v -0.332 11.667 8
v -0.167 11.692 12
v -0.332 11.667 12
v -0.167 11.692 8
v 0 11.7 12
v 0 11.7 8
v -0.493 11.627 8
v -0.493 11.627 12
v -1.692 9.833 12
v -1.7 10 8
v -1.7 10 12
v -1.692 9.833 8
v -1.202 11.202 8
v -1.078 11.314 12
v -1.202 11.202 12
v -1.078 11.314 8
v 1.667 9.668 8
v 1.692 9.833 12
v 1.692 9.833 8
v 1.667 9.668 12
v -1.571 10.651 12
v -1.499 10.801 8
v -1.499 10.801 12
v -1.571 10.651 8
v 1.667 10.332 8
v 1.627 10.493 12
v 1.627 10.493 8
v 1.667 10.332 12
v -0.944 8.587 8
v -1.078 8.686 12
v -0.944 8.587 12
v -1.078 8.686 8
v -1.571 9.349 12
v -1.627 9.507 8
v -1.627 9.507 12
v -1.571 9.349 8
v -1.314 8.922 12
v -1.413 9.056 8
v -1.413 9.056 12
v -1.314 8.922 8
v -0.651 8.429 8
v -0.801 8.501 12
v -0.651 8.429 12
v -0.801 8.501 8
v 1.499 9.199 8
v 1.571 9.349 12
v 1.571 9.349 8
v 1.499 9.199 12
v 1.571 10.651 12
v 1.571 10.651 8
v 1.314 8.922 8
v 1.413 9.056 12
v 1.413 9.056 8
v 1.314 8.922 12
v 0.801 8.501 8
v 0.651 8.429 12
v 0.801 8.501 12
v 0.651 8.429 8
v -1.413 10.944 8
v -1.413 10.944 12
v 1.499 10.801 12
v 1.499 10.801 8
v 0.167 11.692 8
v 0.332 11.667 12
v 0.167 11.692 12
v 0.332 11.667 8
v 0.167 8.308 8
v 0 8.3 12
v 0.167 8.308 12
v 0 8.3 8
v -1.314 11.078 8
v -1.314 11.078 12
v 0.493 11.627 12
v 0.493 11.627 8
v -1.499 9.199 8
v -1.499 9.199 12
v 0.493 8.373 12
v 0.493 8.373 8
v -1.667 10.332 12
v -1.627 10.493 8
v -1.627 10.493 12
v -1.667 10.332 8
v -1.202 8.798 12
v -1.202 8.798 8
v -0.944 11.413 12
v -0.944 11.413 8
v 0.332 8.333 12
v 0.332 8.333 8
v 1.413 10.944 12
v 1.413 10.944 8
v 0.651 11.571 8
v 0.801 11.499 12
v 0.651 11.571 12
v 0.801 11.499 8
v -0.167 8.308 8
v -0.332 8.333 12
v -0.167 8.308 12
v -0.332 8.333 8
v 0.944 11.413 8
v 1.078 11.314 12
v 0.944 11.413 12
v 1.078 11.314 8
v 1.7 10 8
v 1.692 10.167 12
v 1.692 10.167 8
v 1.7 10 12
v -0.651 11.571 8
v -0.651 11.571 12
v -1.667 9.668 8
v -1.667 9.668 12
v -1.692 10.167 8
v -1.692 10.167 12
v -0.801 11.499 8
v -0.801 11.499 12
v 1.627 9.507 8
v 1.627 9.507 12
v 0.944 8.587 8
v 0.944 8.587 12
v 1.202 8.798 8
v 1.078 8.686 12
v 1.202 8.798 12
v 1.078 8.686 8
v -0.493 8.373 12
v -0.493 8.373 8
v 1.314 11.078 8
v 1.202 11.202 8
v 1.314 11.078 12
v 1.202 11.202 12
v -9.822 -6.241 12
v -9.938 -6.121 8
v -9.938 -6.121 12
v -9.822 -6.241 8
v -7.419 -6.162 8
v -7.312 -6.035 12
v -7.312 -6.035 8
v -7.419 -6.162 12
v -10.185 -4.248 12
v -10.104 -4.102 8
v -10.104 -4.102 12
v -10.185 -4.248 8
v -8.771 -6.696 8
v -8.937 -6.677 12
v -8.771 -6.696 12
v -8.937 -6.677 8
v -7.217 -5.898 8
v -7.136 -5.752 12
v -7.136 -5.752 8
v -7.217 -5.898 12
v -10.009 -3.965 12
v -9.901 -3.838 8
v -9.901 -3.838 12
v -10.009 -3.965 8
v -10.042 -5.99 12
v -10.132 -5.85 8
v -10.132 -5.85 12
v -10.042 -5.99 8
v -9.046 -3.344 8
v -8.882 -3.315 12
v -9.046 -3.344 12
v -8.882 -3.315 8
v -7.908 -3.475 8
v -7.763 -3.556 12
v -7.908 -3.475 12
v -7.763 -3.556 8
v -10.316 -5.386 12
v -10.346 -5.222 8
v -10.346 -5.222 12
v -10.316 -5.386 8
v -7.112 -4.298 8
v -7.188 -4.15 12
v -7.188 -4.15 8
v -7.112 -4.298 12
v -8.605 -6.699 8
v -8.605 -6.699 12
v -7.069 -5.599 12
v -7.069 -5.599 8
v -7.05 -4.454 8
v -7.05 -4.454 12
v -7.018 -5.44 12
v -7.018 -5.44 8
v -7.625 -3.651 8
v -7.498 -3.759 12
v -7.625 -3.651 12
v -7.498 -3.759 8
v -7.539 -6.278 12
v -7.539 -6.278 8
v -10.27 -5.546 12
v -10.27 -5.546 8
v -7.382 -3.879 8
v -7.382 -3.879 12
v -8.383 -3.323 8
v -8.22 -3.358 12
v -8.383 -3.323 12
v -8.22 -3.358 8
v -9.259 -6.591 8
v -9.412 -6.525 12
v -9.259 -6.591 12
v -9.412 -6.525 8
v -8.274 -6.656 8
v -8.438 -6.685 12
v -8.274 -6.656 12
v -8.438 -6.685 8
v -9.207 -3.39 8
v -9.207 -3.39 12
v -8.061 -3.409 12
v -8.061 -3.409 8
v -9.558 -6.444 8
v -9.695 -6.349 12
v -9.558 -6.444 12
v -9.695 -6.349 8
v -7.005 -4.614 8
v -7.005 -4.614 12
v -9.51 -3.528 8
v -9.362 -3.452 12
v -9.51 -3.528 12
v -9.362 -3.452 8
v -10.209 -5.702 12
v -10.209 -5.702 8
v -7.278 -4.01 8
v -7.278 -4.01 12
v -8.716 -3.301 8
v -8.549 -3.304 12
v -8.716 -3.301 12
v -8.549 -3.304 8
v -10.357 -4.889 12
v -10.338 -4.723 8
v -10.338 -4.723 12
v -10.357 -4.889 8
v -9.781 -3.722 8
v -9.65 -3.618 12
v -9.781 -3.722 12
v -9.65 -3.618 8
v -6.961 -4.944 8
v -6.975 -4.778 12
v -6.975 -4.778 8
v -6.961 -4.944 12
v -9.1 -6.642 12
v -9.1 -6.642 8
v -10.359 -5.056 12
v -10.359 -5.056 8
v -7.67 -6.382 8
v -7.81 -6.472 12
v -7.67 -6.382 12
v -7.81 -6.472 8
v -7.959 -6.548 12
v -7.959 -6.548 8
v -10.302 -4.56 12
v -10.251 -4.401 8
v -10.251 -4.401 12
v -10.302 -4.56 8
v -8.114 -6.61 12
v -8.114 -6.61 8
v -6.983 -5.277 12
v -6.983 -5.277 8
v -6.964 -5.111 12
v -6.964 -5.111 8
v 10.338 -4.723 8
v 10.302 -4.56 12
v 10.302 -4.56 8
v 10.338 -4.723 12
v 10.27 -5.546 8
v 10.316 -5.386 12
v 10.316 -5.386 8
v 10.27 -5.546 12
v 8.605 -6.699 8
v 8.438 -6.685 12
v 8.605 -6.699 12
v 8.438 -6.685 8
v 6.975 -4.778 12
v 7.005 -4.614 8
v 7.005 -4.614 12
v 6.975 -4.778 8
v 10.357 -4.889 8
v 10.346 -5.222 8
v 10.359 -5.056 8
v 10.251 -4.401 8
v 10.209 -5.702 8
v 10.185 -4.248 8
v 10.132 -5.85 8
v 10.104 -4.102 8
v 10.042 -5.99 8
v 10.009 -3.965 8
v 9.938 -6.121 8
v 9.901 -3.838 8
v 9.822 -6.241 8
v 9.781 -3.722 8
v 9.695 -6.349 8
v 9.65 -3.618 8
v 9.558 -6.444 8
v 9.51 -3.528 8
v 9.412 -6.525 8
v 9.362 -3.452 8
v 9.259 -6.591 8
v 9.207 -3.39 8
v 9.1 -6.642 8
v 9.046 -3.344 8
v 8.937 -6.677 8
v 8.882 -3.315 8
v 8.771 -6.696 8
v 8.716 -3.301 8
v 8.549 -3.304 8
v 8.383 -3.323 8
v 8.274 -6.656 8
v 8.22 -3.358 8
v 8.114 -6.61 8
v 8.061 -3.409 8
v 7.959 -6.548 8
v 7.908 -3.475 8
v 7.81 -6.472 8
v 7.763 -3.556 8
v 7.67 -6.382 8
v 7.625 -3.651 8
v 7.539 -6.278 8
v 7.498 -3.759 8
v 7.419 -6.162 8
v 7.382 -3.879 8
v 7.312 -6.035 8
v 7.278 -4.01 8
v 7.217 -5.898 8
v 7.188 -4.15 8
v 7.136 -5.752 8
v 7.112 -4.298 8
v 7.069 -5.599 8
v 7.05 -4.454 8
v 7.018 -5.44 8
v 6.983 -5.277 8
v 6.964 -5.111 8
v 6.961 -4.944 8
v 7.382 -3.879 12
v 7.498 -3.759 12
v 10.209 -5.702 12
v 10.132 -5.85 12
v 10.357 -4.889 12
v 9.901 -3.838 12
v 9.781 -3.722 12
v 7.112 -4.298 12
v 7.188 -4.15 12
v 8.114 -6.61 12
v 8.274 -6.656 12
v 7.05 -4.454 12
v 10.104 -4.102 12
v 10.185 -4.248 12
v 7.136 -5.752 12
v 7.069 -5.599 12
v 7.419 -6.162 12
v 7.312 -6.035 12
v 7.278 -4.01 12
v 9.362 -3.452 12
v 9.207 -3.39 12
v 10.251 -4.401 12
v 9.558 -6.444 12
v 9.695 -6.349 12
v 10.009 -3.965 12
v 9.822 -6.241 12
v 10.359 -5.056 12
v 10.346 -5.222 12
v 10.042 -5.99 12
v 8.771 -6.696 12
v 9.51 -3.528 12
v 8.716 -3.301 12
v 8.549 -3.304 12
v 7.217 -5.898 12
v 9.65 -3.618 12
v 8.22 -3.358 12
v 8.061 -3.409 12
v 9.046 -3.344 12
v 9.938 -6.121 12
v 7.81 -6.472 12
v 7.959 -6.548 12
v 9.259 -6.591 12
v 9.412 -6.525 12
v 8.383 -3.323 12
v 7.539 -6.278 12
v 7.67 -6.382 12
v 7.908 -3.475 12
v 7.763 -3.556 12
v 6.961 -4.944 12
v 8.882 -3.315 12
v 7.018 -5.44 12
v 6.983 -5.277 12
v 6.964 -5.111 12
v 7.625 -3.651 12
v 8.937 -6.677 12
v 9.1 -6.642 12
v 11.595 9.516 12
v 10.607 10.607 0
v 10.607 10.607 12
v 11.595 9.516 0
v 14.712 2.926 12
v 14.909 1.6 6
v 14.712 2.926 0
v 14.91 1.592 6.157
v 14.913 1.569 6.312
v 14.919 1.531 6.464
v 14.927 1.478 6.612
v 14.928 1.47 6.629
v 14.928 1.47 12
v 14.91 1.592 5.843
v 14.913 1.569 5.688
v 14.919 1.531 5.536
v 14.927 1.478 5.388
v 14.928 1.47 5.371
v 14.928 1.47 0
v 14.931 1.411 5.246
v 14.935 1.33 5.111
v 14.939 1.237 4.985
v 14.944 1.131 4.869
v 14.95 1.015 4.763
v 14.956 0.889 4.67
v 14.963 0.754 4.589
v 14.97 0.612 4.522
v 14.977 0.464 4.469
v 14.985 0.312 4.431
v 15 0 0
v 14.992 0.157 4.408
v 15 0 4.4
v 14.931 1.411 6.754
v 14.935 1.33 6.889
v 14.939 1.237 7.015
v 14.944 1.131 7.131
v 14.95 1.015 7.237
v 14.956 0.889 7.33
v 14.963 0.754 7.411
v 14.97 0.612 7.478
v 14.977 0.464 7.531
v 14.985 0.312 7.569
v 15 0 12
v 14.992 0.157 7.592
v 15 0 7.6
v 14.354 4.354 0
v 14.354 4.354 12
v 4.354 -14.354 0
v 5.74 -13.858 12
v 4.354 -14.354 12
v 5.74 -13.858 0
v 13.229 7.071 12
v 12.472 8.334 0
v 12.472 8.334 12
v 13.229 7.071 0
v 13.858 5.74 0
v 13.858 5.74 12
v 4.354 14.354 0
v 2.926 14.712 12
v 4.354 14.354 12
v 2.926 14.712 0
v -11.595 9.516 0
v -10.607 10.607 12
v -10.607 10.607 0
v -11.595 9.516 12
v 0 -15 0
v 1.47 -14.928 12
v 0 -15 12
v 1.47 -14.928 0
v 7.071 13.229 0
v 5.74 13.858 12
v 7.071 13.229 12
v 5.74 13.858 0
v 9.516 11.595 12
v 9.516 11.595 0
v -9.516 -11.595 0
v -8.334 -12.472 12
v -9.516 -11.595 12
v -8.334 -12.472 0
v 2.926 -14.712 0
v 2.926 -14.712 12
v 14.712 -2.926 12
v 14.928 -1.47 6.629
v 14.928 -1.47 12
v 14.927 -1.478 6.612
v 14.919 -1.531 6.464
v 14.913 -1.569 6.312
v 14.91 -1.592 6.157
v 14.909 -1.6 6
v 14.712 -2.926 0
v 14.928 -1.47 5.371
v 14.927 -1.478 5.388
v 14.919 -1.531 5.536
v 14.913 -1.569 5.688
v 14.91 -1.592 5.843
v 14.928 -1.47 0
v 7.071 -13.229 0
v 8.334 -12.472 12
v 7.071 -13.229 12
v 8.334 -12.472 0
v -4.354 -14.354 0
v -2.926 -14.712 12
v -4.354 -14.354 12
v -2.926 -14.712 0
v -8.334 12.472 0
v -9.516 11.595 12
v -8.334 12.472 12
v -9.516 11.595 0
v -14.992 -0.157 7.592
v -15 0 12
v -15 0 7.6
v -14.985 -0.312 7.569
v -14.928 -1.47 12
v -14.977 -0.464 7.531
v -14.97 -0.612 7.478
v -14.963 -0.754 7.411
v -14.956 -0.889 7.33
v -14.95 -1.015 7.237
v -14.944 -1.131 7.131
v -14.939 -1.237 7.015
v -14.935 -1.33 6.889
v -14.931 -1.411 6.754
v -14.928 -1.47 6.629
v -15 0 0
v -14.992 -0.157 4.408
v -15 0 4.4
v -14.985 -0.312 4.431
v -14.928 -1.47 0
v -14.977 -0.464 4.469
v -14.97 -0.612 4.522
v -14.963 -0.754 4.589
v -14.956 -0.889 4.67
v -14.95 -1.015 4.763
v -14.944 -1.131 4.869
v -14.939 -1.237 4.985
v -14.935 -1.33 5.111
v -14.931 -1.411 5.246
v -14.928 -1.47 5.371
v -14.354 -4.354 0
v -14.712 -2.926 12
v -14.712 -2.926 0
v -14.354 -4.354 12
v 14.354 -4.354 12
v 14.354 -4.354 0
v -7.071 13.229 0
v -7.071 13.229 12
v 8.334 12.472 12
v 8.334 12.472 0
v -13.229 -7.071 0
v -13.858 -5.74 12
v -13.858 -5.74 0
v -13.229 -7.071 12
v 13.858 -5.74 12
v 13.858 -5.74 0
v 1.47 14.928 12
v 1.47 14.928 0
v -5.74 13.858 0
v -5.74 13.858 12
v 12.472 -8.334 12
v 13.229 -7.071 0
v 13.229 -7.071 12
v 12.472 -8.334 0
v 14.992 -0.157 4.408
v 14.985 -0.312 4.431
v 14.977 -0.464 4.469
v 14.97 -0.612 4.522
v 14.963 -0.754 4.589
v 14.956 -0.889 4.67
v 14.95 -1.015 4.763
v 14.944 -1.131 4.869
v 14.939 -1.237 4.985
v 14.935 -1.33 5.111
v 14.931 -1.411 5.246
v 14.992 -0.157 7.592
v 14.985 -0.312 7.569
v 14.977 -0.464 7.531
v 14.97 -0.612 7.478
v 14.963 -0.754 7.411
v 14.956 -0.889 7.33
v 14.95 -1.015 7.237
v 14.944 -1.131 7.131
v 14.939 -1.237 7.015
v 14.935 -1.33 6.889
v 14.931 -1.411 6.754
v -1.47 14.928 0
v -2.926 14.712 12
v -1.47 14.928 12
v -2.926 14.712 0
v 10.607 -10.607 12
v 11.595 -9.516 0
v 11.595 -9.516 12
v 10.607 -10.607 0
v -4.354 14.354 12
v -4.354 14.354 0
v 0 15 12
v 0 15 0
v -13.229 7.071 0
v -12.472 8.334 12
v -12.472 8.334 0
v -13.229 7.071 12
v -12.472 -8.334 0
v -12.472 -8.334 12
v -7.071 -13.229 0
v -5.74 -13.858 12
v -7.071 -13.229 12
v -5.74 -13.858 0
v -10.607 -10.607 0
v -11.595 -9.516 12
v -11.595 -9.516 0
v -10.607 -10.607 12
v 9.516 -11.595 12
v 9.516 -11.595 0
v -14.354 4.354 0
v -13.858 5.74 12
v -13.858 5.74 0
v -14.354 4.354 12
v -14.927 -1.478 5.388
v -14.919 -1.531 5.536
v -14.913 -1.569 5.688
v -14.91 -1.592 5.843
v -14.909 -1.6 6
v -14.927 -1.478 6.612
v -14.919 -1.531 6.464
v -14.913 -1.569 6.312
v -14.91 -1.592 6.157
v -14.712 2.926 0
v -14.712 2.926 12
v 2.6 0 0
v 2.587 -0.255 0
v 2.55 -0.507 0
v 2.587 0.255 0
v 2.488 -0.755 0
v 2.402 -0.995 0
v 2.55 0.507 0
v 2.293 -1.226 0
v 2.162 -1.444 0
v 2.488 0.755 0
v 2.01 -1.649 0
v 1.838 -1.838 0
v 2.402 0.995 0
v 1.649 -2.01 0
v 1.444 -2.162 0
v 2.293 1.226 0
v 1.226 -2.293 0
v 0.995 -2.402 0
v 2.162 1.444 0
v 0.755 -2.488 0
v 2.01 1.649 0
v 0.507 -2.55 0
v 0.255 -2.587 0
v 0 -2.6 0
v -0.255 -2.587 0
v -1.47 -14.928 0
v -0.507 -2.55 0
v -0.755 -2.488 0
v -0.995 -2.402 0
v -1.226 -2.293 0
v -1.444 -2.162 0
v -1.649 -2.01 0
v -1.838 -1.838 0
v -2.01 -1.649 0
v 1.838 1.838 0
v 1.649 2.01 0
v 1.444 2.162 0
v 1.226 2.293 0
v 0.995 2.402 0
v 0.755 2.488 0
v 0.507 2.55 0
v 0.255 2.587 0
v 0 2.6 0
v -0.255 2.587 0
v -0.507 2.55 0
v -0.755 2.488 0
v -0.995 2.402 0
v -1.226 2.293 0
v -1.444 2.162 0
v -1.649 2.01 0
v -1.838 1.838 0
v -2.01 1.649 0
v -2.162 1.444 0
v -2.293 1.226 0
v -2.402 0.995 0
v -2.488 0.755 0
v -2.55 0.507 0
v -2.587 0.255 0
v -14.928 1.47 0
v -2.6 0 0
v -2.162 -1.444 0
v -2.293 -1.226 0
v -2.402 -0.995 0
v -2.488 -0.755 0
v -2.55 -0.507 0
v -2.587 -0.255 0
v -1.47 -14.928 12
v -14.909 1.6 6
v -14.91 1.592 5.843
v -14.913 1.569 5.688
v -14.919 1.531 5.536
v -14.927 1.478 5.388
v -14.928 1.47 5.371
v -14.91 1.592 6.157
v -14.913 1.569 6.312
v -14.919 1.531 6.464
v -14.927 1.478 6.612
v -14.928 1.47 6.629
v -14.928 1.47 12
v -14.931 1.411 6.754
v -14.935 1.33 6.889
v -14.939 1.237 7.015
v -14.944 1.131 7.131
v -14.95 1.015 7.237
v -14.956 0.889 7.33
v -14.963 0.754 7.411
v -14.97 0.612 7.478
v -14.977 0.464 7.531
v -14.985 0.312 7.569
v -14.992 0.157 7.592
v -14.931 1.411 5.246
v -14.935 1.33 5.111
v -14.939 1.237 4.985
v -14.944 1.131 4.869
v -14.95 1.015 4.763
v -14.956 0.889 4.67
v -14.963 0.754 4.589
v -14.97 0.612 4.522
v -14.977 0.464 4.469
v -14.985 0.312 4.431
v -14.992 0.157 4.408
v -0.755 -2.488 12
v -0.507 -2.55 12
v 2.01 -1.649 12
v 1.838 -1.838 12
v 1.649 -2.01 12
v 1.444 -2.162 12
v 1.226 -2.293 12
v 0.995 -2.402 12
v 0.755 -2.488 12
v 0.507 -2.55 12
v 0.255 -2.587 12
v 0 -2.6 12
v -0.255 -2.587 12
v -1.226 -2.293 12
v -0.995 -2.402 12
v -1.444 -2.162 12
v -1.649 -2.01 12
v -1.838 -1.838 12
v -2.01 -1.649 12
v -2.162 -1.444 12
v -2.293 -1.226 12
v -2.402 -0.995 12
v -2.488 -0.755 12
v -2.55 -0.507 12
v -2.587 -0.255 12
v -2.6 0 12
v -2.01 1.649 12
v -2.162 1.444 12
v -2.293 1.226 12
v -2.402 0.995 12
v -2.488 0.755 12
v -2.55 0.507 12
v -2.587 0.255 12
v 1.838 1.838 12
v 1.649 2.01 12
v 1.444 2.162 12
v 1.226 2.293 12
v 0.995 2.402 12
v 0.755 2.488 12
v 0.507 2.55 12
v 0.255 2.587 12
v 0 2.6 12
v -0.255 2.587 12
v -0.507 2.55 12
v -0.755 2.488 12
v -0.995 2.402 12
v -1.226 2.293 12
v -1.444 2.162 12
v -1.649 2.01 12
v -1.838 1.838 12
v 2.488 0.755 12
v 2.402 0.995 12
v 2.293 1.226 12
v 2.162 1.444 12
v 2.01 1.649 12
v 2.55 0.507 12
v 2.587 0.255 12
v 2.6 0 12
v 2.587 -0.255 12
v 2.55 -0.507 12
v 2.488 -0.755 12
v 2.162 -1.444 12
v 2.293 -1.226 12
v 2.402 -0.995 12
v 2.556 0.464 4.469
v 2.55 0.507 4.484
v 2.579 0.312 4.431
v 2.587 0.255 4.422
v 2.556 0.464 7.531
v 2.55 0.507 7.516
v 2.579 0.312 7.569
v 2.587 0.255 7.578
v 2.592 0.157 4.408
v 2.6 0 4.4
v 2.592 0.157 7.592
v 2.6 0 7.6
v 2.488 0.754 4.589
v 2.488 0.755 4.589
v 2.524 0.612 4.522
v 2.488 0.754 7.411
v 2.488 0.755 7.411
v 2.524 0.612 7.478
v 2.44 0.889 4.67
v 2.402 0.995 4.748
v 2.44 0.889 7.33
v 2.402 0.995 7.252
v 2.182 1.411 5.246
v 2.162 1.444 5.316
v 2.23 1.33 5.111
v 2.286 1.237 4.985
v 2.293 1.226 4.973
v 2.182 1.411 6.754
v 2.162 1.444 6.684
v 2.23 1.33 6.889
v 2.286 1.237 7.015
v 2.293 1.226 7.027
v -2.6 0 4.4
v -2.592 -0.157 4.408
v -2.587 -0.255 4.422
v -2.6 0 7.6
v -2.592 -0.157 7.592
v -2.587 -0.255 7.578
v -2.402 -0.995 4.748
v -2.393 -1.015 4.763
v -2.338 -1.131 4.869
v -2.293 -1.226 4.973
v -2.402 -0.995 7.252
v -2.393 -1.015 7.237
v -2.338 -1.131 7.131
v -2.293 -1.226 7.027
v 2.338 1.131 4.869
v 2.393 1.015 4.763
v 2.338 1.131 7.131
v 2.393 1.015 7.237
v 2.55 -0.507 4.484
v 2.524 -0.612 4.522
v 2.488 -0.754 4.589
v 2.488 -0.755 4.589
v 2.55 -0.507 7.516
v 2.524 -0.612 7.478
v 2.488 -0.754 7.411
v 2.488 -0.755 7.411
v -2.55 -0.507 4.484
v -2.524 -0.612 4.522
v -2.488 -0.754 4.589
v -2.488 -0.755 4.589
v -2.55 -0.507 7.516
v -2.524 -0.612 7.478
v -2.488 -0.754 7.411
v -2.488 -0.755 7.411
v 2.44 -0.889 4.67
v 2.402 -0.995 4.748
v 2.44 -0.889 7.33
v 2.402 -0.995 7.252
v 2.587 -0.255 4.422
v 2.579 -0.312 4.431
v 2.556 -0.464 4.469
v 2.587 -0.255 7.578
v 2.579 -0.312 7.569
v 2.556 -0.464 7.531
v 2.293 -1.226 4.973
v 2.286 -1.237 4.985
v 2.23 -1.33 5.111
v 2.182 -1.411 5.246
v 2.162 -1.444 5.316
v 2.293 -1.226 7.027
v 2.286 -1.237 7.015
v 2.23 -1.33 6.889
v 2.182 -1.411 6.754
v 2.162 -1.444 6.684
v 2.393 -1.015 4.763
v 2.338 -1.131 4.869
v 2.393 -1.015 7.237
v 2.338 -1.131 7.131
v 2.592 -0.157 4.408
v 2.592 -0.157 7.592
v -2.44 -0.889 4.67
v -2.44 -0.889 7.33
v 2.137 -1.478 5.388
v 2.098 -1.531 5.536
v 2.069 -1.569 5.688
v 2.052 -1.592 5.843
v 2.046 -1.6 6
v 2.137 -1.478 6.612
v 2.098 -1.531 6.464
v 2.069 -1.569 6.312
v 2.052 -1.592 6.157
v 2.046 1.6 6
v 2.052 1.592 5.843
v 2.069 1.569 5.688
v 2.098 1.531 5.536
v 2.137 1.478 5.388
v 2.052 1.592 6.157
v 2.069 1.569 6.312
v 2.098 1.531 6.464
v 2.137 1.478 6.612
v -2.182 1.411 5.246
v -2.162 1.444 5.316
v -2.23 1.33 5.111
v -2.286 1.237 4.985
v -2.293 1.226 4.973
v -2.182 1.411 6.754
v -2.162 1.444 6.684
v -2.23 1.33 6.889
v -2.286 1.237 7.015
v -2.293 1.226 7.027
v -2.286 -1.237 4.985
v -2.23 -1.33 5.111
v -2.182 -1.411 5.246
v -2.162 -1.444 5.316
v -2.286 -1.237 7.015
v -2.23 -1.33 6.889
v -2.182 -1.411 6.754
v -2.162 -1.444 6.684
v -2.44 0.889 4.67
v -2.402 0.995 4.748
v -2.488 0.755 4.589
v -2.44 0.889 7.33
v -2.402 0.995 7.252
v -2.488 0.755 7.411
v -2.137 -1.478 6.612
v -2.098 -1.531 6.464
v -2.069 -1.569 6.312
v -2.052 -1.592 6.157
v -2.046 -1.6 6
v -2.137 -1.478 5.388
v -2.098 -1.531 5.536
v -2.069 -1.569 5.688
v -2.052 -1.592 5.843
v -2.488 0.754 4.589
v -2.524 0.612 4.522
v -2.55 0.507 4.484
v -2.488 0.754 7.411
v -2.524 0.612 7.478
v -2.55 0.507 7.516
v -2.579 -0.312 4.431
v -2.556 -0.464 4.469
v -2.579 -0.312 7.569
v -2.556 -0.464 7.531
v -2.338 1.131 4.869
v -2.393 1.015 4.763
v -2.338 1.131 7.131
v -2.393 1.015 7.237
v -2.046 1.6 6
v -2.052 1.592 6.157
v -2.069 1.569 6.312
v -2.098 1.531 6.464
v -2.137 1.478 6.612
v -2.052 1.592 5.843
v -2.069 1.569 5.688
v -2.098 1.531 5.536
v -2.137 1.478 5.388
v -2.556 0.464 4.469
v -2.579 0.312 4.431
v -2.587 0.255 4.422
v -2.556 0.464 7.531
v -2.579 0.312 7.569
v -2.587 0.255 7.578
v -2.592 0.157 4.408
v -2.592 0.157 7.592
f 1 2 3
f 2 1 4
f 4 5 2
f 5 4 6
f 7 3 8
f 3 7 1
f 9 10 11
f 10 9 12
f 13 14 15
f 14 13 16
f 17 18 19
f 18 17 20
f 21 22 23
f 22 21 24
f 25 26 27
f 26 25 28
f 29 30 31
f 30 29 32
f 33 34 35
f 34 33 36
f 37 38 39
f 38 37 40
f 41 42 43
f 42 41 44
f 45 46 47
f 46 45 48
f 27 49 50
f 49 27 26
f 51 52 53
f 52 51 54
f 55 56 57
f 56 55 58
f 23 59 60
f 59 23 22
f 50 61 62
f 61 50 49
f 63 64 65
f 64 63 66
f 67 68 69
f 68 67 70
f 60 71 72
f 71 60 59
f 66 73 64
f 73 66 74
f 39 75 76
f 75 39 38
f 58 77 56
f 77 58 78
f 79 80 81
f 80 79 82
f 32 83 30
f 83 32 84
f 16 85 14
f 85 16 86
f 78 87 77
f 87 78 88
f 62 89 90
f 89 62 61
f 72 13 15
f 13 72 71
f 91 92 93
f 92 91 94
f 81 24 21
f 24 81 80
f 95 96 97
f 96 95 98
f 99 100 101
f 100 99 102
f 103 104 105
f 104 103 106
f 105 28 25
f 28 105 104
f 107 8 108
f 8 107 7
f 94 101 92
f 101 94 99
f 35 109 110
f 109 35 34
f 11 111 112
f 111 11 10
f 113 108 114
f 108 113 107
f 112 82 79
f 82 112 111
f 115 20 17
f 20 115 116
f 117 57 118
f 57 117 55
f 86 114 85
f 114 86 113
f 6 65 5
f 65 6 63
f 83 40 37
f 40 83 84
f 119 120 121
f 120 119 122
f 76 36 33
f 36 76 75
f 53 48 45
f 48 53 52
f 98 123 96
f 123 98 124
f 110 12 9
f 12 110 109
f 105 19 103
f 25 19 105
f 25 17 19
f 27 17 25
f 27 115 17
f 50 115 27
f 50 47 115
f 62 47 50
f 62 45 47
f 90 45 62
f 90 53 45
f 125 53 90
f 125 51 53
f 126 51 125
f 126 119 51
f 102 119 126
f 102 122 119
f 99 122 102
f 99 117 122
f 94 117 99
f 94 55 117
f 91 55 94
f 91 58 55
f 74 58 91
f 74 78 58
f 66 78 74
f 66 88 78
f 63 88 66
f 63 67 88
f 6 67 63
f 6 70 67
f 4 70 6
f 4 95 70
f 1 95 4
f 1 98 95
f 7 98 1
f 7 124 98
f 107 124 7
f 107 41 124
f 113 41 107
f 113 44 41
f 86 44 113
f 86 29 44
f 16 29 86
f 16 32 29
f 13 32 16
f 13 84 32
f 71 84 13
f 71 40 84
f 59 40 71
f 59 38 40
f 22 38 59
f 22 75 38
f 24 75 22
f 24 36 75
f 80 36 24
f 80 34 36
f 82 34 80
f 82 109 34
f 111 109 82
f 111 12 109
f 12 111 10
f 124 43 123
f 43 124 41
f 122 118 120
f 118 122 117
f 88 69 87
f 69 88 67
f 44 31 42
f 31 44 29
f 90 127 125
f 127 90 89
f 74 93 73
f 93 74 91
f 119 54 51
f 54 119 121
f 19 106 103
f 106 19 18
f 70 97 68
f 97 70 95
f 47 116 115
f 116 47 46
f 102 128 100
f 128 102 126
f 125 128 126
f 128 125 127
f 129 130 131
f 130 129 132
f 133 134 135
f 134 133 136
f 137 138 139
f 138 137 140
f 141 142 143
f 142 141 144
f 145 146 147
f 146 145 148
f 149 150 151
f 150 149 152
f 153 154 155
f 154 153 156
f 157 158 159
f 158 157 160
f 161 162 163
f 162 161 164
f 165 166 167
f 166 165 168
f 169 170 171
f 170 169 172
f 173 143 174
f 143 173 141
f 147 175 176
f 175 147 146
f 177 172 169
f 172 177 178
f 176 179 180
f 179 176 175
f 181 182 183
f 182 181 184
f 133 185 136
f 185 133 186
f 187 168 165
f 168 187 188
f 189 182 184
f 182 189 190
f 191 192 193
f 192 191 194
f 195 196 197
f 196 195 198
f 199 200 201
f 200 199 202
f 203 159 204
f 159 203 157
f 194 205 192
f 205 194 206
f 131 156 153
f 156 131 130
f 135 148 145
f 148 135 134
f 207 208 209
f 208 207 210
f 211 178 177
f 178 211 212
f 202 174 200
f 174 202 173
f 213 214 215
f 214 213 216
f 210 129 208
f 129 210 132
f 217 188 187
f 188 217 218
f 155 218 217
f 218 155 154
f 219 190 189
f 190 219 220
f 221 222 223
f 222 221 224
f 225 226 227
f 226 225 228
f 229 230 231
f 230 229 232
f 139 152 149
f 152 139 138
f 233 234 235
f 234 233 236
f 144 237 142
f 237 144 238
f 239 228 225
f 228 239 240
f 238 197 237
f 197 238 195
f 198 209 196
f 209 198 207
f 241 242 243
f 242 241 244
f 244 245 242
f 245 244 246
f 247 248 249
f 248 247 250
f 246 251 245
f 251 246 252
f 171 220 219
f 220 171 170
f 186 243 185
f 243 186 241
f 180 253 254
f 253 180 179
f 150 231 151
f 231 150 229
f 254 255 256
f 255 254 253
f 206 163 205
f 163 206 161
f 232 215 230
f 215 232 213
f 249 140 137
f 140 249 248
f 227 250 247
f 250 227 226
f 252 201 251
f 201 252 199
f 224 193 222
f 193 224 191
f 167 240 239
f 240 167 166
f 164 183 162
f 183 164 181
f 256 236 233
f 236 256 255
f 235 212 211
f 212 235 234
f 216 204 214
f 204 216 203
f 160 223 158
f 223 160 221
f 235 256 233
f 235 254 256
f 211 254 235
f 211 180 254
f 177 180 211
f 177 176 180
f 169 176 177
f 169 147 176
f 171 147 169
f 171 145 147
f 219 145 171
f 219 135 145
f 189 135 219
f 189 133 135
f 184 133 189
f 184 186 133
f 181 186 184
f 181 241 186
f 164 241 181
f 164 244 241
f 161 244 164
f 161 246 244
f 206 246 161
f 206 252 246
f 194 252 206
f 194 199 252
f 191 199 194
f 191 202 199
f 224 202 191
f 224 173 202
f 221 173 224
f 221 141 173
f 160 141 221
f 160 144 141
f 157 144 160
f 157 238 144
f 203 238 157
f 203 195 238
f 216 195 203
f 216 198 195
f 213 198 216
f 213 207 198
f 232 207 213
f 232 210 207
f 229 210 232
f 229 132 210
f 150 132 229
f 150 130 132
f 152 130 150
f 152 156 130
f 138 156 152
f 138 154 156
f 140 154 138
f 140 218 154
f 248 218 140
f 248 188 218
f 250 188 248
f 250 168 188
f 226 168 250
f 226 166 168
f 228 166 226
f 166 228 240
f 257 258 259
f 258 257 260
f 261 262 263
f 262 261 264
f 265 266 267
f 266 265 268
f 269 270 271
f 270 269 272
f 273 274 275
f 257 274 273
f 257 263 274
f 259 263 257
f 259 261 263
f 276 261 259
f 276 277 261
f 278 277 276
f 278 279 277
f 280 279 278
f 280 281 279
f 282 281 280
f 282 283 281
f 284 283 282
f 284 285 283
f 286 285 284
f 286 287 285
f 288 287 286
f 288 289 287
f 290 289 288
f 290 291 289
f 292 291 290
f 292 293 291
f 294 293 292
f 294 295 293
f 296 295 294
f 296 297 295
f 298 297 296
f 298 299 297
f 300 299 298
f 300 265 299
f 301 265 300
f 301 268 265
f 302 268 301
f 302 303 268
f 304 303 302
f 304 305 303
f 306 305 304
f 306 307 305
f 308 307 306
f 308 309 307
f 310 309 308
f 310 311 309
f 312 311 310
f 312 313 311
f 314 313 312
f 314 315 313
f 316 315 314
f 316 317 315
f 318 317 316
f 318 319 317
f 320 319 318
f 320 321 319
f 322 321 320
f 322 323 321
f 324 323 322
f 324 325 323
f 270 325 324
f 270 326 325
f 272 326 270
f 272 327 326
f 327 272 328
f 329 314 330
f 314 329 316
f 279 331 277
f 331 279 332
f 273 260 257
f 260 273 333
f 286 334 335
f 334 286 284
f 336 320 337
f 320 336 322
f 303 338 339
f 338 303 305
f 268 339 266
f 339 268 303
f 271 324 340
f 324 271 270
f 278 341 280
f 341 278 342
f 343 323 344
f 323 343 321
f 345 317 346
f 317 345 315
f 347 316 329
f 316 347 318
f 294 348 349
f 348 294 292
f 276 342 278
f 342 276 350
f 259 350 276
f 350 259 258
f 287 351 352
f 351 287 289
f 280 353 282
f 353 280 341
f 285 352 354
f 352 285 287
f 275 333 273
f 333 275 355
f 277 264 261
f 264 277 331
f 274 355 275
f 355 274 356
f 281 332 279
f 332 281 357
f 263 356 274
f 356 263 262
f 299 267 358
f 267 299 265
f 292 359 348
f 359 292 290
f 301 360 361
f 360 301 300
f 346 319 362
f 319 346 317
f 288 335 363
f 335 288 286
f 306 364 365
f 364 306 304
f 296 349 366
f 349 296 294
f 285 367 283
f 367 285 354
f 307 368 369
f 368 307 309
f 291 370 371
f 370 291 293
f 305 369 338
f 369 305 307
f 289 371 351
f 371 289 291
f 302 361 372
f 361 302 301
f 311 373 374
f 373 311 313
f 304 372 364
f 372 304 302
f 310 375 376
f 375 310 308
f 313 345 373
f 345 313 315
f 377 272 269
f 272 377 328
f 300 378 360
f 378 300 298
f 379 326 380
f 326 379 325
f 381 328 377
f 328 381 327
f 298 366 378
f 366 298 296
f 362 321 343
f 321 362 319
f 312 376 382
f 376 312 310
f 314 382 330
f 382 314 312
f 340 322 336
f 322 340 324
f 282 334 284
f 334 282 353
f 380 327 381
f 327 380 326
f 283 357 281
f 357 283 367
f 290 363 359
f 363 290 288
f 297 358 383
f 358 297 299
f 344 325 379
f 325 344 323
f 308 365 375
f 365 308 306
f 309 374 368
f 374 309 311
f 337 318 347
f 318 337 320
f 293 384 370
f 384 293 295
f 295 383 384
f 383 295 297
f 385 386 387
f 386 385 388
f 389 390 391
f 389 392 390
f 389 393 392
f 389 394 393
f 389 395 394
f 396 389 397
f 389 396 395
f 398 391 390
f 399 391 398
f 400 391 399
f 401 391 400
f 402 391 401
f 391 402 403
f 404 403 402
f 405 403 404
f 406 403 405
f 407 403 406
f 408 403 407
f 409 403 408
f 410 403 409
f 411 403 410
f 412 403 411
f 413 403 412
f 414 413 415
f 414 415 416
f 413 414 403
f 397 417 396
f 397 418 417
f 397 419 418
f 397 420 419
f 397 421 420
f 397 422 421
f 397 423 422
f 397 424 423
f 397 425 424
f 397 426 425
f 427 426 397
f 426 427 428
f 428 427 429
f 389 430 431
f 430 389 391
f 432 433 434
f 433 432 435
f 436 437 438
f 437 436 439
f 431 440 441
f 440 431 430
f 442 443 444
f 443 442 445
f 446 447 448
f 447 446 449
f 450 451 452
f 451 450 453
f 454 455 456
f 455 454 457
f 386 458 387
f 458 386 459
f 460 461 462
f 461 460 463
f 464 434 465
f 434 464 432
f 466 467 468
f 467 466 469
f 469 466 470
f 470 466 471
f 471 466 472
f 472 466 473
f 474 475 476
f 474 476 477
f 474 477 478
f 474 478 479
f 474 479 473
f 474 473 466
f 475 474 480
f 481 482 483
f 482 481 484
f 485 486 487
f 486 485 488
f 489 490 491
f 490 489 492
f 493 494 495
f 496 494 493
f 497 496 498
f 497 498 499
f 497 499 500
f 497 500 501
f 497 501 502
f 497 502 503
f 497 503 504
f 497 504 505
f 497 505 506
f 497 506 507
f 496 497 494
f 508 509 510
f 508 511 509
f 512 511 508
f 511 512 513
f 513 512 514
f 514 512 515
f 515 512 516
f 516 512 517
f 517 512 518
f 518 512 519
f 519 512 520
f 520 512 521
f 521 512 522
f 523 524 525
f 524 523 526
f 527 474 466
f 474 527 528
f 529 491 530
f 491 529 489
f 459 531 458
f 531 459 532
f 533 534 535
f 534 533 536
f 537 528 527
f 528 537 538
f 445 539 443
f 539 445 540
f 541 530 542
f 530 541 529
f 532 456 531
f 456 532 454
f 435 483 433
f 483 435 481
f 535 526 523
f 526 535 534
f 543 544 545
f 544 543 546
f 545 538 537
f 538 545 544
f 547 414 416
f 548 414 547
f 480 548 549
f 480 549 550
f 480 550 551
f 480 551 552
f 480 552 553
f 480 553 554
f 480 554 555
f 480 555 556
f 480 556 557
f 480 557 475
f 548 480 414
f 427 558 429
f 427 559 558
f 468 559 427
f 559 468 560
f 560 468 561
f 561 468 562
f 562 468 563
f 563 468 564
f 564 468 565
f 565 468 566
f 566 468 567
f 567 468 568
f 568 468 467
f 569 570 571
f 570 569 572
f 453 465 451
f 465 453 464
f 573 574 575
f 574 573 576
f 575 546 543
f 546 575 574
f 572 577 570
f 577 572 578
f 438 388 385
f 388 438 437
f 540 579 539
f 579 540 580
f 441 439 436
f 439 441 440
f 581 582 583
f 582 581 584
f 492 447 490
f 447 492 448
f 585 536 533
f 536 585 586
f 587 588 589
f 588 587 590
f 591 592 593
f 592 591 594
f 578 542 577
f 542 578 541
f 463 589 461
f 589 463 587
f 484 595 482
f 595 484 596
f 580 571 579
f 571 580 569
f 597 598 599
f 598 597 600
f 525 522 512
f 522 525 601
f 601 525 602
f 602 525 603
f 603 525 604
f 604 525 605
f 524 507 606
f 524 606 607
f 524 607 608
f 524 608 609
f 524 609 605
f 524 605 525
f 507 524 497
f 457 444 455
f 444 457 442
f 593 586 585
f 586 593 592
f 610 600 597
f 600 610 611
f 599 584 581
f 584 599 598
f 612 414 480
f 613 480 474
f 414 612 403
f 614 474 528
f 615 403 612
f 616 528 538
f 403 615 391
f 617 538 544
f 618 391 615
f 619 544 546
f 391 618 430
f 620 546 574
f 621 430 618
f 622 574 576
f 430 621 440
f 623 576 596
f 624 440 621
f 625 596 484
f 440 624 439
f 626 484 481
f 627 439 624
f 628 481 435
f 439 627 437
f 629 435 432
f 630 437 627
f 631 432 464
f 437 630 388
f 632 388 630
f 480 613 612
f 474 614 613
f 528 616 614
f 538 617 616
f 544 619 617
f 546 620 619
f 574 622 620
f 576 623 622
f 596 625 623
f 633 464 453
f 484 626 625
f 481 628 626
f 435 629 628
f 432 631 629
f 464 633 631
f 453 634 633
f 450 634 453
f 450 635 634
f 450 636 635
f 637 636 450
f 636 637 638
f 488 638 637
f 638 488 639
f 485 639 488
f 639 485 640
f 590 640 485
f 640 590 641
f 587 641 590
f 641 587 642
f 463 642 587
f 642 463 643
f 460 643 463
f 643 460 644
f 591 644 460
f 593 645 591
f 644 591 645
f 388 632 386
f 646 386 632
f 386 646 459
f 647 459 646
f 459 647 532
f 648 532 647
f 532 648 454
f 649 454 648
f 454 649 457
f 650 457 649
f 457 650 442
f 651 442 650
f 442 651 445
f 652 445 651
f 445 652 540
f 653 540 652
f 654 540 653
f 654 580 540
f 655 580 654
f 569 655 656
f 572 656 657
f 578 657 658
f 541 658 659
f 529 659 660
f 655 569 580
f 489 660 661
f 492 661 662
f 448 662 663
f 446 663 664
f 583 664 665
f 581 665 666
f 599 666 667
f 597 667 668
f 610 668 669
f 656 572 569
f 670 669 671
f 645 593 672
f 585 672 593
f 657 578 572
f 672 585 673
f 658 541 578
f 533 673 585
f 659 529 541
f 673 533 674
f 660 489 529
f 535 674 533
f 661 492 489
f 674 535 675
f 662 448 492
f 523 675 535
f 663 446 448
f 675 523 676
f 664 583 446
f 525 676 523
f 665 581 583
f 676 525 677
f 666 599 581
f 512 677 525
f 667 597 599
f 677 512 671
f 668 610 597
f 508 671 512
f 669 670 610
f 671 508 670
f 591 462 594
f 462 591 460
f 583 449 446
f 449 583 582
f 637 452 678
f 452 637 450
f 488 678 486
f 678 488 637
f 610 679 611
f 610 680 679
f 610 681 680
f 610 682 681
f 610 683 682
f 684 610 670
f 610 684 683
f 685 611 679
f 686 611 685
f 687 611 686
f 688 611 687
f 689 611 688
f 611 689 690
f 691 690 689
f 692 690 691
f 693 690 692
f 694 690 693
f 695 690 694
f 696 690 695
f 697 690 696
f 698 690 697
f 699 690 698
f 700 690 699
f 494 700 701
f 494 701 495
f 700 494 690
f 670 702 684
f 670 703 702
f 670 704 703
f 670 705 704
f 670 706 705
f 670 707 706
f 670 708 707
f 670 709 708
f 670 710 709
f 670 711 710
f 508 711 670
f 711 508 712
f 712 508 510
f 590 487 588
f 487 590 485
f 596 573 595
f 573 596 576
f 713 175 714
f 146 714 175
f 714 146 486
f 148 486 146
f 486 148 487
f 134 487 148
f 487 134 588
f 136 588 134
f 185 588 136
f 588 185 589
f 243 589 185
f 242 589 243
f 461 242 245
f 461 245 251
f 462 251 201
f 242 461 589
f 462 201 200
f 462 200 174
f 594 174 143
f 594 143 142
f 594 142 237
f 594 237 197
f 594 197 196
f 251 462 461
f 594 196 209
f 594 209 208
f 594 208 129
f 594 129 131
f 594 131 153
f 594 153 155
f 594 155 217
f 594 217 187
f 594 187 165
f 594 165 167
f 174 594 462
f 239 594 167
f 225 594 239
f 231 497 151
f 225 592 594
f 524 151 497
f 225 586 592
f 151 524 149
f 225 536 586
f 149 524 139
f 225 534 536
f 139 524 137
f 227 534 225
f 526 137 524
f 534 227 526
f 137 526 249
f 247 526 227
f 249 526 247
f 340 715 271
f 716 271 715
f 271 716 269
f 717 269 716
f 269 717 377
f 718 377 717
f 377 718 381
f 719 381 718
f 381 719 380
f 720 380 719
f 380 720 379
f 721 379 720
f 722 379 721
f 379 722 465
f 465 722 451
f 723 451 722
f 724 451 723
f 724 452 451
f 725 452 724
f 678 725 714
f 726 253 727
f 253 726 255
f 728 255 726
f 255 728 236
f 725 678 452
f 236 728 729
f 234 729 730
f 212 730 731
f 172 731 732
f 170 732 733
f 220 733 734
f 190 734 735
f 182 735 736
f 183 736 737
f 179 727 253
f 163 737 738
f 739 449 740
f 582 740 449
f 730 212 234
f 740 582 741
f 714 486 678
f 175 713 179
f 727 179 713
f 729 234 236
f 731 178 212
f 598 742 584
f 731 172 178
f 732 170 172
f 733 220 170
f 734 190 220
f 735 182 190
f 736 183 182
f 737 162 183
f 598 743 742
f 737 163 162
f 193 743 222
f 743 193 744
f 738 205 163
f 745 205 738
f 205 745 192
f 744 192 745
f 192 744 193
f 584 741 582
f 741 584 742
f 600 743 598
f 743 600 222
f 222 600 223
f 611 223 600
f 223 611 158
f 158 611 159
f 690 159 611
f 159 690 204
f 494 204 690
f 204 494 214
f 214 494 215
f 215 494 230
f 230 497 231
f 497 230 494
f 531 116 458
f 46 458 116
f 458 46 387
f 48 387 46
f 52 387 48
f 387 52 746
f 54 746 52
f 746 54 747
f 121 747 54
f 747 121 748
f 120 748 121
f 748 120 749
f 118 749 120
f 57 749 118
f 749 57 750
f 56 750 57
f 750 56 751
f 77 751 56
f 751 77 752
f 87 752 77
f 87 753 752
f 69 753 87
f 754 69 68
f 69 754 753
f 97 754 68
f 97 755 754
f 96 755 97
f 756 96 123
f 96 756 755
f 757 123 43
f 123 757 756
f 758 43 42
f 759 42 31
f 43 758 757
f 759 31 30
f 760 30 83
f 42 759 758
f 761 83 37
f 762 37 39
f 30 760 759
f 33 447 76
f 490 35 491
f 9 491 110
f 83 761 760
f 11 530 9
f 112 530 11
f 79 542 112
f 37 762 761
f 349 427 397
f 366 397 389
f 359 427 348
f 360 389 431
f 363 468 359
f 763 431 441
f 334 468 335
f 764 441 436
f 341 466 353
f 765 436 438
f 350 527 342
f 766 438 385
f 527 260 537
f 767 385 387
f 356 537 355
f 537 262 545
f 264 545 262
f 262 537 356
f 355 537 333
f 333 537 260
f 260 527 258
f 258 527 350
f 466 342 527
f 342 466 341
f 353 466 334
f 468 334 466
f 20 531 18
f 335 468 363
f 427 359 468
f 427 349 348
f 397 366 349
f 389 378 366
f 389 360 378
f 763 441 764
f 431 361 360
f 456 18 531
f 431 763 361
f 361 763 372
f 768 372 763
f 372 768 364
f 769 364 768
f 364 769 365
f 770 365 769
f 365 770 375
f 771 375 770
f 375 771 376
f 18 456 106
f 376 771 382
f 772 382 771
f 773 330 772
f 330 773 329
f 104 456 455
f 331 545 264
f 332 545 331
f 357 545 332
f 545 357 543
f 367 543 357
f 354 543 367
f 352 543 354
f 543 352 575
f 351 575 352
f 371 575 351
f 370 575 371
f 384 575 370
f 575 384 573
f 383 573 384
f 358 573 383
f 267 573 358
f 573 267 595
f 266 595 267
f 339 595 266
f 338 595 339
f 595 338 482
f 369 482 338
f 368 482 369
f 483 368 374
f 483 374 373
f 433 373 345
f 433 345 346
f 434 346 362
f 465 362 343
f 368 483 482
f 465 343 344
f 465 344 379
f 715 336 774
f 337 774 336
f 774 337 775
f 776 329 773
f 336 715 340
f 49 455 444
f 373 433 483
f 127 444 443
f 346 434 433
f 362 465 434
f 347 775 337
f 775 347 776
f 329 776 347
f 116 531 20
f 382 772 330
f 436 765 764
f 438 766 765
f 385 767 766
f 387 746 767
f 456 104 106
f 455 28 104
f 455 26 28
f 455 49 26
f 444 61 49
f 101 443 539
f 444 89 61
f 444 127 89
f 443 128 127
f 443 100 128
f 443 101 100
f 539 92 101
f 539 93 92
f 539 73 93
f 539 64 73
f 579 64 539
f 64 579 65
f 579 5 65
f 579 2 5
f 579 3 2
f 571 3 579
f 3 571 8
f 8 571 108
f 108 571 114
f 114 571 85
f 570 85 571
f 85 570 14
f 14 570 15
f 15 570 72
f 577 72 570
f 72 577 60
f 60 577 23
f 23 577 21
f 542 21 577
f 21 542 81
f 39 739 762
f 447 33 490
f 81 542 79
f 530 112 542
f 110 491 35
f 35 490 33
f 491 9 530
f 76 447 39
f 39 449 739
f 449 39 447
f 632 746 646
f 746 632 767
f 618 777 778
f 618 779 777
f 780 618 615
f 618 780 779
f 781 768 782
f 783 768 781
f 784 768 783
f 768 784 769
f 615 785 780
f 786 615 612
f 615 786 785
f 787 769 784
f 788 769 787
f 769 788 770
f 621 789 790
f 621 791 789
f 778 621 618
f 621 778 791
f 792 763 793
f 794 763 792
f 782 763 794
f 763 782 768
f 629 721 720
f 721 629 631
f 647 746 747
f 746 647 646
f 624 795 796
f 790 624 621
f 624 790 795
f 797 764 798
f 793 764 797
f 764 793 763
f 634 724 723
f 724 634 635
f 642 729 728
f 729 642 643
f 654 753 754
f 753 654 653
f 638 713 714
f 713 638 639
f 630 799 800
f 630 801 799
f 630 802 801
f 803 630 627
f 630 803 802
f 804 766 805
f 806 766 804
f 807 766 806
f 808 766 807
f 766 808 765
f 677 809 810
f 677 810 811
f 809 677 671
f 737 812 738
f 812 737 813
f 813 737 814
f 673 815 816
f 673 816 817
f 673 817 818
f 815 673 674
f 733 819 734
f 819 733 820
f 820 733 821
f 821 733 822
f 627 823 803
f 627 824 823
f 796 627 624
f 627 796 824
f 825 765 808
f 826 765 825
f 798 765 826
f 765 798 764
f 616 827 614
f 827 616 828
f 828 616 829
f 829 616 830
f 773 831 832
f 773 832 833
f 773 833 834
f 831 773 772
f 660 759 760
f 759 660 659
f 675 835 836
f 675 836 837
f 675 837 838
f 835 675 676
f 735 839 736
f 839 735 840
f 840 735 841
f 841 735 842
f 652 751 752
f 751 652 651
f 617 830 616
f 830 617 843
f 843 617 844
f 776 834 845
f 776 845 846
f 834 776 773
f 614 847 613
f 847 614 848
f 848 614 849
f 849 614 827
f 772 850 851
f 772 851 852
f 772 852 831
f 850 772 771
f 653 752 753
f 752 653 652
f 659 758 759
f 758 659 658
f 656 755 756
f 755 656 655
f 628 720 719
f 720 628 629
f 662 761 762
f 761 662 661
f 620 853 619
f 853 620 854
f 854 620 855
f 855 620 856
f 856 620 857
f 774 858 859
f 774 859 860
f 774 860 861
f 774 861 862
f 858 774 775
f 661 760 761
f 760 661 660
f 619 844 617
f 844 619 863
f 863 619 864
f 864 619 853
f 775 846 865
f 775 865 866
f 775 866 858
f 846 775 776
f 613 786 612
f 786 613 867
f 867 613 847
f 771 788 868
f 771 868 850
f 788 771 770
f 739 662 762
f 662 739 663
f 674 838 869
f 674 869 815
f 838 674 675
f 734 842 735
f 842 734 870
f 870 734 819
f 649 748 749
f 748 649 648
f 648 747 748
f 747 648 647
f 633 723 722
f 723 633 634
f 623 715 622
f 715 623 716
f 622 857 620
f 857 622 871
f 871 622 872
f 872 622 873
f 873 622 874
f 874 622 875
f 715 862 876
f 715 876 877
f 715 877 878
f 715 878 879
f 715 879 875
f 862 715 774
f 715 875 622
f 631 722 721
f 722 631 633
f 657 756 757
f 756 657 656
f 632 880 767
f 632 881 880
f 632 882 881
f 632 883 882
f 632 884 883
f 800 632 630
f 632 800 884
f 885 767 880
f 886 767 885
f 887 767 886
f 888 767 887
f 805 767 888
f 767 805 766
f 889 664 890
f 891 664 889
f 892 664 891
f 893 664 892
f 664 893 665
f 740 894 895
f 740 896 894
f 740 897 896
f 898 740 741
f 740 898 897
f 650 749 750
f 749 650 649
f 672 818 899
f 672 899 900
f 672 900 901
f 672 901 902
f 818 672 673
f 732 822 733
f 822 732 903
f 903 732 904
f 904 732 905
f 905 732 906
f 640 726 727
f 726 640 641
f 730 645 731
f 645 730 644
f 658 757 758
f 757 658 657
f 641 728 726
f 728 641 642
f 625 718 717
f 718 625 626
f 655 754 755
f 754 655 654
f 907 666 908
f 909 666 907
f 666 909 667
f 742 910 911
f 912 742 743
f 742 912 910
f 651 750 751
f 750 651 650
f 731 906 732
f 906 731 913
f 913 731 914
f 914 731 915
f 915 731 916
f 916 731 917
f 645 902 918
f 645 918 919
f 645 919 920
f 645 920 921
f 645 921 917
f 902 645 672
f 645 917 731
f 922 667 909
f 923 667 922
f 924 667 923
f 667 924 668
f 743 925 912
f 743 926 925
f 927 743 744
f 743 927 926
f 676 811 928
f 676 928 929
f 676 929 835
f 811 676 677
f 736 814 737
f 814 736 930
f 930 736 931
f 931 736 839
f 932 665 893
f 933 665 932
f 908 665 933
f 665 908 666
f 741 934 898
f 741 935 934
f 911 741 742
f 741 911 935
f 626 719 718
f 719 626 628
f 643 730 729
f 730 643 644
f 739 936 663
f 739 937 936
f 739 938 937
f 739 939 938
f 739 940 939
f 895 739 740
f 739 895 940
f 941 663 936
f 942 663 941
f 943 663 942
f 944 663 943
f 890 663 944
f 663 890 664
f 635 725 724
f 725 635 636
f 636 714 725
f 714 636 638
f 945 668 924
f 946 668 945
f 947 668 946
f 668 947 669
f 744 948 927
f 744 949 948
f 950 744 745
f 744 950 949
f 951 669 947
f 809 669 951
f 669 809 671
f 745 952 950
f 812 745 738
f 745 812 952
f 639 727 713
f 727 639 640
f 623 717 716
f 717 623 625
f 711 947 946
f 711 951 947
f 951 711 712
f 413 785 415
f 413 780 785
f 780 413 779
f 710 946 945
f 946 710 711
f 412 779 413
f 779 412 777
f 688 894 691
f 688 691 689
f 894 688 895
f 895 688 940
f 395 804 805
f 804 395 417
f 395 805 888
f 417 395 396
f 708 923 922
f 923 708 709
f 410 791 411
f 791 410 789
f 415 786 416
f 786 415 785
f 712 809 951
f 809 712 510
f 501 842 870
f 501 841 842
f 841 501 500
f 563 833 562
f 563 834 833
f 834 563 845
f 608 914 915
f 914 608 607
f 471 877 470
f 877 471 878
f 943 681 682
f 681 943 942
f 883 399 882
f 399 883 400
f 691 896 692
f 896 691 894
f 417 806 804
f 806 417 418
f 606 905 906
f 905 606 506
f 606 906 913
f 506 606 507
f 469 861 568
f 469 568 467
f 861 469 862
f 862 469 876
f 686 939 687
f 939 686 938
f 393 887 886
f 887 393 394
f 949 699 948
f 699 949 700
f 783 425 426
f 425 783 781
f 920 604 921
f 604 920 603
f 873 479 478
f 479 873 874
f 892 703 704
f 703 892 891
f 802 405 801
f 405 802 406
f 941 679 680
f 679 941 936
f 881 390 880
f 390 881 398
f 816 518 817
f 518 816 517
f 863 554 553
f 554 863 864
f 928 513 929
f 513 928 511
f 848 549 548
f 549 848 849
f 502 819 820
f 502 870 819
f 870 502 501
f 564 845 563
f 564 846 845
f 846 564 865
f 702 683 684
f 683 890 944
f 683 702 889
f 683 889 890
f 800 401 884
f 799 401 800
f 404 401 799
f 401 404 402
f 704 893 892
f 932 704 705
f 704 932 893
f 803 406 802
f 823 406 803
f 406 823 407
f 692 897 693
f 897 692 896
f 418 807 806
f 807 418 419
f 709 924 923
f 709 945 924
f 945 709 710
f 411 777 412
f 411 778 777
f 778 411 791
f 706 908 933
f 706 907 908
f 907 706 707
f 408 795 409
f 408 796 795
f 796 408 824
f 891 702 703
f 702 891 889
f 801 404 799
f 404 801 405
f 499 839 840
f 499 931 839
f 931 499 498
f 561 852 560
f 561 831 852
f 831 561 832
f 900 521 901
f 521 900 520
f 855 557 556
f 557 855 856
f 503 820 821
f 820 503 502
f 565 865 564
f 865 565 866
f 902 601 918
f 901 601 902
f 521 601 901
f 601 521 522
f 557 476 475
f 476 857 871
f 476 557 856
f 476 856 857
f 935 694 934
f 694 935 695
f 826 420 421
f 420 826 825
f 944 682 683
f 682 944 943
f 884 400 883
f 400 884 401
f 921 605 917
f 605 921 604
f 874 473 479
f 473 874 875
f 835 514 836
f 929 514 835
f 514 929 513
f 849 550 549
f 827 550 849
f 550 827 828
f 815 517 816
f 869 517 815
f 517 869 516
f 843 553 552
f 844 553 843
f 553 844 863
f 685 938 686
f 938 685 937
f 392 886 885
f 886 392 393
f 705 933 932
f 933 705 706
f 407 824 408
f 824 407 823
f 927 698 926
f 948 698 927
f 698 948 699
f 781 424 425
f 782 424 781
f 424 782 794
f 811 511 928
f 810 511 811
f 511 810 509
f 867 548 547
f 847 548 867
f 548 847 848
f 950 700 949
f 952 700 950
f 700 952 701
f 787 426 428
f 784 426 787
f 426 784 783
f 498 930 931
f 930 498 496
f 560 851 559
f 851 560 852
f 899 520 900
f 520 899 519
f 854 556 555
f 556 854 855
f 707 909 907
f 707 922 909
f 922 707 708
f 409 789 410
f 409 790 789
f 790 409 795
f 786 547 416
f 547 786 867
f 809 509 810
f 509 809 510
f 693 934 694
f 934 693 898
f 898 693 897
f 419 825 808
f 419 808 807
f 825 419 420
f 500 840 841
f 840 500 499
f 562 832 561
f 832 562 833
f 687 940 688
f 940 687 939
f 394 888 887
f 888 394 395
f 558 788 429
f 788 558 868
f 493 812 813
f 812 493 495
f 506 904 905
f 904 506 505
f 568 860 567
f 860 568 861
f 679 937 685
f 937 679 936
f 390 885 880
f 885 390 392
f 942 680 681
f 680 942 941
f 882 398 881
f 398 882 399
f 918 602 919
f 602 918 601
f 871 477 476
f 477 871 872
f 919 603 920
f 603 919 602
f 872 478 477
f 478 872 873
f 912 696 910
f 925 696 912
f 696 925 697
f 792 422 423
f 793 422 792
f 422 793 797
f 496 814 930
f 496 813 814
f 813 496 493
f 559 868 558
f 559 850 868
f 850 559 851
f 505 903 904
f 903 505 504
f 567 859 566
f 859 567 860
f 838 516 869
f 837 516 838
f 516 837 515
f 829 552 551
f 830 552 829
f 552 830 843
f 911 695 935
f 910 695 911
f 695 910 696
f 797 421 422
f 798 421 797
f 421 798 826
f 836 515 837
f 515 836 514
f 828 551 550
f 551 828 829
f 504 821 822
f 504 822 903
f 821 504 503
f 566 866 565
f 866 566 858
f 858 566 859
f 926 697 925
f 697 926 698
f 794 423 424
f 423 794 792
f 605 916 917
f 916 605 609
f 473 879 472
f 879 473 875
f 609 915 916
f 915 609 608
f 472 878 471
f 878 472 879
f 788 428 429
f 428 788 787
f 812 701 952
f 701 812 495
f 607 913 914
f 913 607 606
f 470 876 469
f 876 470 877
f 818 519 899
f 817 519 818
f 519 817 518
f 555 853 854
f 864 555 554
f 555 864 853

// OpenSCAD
// 28BYJ-48 shaft hub (Budget tier) -- see PRINTS.md.
// IMPORTANT: many 28BYJ-48 kits ship with a small plastic coupler/gear
// already pressed onto the output shaft. Either remove it and bore this
// hub for the bare ~5mm D-shaft (default below), or measure that
// coupler's OD and change shaft_bore_d to clamp onto it instead -- check
// your kit before printing. Bolts to the platter via the same 3x M3
// pattern as motor_hub_nema17.scad (must match platter.scad).
// Print with the bore axis vertical, no supports needed.
$fn = 64;

hub_d = 30;
hub_h = 12;   // 28BYJ-48's output shaft is shorter than a NEMA17's -- less engagement needed/available

shaft_bore_d = 5.2;    // verify against your kit -- see note above
setscrew_d = 3.2;

bolt_circle_d = 20;    // MUST match platter.scad's hub_bolt_circle_d
bolt_hole_d = 3.4;
bolt_angles = [90, 210, 330];  // MUST match platter.scad's hub_angles

difference() {
    cylinder(d = hub_d, h = hub_h);

    translate([0, 0, -1]) cylinder(d = shaft_bore_d, h = hub_h + 2);

    translate([0, 0, hub_h / 2])
        rotate([0, 90, 0])
            cylinder(d = setscrew_d, h = hub_d, center = true);

    translate([0, 0, hub_h - 4])
        for (a = bolt_angles)
            rotate([0, 0, a])
                translate([bolt_circle_d / 2, 0, 0])
                    cylinder(d = bolt_hole_d, h = 10);
}
